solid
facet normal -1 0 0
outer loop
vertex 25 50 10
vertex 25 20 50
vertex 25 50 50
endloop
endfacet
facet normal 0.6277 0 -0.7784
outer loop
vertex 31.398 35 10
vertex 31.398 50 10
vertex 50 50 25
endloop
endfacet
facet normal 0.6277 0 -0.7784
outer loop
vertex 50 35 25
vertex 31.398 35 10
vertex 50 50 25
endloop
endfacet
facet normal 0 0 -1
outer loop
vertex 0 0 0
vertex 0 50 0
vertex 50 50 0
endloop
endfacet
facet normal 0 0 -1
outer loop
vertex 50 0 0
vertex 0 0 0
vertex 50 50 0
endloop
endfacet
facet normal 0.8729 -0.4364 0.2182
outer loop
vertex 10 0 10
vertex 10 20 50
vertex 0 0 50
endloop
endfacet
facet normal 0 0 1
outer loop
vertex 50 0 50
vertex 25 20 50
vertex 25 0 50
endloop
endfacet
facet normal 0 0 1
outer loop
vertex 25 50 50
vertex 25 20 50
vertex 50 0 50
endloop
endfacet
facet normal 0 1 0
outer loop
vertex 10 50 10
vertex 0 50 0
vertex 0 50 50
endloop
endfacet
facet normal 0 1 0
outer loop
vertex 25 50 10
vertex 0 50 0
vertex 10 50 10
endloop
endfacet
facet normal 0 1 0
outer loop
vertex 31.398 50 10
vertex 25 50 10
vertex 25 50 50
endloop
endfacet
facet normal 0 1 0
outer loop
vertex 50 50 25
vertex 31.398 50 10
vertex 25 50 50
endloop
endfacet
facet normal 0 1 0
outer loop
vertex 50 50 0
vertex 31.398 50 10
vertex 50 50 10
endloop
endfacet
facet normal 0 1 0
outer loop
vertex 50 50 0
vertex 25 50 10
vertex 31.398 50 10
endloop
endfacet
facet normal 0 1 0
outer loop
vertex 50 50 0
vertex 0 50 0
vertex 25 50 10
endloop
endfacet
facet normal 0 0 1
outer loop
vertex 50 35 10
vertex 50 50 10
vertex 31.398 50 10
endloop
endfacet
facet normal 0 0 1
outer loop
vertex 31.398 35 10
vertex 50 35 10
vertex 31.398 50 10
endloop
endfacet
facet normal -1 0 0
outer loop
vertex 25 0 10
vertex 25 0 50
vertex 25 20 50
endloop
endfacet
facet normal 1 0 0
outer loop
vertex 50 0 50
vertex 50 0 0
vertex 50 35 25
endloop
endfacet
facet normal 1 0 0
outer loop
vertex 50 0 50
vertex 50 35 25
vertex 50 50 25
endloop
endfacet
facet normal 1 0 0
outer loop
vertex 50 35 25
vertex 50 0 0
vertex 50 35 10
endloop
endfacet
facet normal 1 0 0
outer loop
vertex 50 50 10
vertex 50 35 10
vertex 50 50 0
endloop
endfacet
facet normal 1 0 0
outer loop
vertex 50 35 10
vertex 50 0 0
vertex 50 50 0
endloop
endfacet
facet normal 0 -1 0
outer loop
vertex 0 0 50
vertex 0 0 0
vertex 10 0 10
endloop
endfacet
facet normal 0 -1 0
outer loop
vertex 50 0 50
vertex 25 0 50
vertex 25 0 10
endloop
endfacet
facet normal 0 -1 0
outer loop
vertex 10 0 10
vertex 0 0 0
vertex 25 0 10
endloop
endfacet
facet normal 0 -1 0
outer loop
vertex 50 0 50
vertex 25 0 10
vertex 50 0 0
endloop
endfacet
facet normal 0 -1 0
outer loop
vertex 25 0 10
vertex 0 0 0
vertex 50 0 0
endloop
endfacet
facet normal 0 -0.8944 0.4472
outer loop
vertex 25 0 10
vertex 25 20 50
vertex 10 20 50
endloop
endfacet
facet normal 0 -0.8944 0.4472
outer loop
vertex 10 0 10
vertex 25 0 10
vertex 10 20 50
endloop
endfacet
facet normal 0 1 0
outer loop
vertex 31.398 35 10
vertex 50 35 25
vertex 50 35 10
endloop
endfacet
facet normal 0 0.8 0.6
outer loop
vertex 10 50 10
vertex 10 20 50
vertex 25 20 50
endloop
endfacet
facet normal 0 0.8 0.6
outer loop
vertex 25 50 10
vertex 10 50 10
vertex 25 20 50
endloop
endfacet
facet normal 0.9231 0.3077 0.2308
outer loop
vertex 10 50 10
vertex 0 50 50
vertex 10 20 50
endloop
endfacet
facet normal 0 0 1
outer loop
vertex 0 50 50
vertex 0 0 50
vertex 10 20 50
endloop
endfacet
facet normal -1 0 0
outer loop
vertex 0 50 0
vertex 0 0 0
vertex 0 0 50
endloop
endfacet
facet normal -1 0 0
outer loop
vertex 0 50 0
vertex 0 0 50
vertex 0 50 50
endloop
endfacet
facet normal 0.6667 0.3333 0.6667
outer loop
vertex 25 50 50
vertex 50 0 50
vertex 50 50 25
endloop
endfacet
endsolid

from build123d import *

# Parameters (mm, degrees)
F0_W      = 50
F0_H      = 50
F1_DEPTH  = 50
F3_W      = 15
F3_H      = 20
F4_W      = 15
F4_H      = 35.264277
F3_H_2    = 30
F15_DEPTH = 15


with BuildPart() as f1:
    # F0 (on Top) → F1 (new body)
    with BuildSketch(Plane.XY):
        with Locations((25, 25)):
            Rectangle(F0_W, F0_H)
    extrude(amount=F1_DEPTH)

    # F6: sweep along a path in F5
    with BuildLine(Plane.YZ.offset(50)) as f6_path:
        Line((0, 10), (20, 50))
    # F3 (on face) + F4 (on face) → F6 (sweep, cut)
    with BuildSketch(Plane.XY.offset(50)):
        with Locations((17.5, 10)):
            Rectangle(F3_W, F3_H)
    with BuildSketch(Plane.XZ):
        with Locations((17.5, 32.367862)):
            Rectangle(F4_W, F4_H)
    sweep(path=f6_path.line, mode=Mode.SUBTRACT)

    # F8: sweep along a path in F7
    with BuildLine(Plane.YZ.offset(50)) as f8_path:
        Line((50, 10), (20, 50))
    # F3 (on face) → F8 (sweep, cut)
    with BuildSketch(Plane.XY.offset(50)):
        with Locations((17.5, 35)):
            Rectangle(F3_W, F3_H_2)
    sweep(path=f8_path.line, mode=Mode.SUBTRACT)

    # F9: sweep along a path in F5
    with BuildLine(Plane.YZ.offset(50)) as f9_path:
        Line((0, 10), (20, 50))
    # F3 (on face) → F9 (sweep, cut)
    with BuildSketch(Plane.XY.offset(50)):
        Polygon((10, 0), (10, 20), (0, 0), align=None)
    sweep(path=f9_path.line, mode=Mode.SUBTRACT)

    # F10: sweep along a path in F7
    with BuildLine(Plane.YZ.offset(50)) as f10_path:
        Line((50, 10), (20, 50))
    # F3 (on face) → F10 (sweep, cut)
    with BuildSketch(Plane.XY.offset(50)):
        Polygon((10, 50), (0, 50), (10, 20), align=None)
    sweep(path=f10_path.line, mode=Mode.SUBTRACT)

    # F13: sweep along a path in F11
    with BuildLine(Plane.XY.offset(50)) as f13_path:
        Line((25, 50), (50, 0))
    # F12 (on face) → F13 (sweep, cut)
    with BuildSketch(Plane.YZ.offset(50)):
        Polygon((50, 50), (0, 50), (50, 25), align=None)
    sweep(path=f13_path.line, mode=Mode.SUBTRACT)

    # F14 (on face) → F15 (cut)
    with BuildSketch(Plane(origin=(0, 50, 0), x_dir=(-1, 0, 0), z_dir=(0, 1, 0))):
        Polygon((-31.397693, 10), (-50, 25), (-50, 10), align=None)
    extrude(amount=-F15_DEPTH, mode=Mode.SUBTRACT)


solid = f1.part
